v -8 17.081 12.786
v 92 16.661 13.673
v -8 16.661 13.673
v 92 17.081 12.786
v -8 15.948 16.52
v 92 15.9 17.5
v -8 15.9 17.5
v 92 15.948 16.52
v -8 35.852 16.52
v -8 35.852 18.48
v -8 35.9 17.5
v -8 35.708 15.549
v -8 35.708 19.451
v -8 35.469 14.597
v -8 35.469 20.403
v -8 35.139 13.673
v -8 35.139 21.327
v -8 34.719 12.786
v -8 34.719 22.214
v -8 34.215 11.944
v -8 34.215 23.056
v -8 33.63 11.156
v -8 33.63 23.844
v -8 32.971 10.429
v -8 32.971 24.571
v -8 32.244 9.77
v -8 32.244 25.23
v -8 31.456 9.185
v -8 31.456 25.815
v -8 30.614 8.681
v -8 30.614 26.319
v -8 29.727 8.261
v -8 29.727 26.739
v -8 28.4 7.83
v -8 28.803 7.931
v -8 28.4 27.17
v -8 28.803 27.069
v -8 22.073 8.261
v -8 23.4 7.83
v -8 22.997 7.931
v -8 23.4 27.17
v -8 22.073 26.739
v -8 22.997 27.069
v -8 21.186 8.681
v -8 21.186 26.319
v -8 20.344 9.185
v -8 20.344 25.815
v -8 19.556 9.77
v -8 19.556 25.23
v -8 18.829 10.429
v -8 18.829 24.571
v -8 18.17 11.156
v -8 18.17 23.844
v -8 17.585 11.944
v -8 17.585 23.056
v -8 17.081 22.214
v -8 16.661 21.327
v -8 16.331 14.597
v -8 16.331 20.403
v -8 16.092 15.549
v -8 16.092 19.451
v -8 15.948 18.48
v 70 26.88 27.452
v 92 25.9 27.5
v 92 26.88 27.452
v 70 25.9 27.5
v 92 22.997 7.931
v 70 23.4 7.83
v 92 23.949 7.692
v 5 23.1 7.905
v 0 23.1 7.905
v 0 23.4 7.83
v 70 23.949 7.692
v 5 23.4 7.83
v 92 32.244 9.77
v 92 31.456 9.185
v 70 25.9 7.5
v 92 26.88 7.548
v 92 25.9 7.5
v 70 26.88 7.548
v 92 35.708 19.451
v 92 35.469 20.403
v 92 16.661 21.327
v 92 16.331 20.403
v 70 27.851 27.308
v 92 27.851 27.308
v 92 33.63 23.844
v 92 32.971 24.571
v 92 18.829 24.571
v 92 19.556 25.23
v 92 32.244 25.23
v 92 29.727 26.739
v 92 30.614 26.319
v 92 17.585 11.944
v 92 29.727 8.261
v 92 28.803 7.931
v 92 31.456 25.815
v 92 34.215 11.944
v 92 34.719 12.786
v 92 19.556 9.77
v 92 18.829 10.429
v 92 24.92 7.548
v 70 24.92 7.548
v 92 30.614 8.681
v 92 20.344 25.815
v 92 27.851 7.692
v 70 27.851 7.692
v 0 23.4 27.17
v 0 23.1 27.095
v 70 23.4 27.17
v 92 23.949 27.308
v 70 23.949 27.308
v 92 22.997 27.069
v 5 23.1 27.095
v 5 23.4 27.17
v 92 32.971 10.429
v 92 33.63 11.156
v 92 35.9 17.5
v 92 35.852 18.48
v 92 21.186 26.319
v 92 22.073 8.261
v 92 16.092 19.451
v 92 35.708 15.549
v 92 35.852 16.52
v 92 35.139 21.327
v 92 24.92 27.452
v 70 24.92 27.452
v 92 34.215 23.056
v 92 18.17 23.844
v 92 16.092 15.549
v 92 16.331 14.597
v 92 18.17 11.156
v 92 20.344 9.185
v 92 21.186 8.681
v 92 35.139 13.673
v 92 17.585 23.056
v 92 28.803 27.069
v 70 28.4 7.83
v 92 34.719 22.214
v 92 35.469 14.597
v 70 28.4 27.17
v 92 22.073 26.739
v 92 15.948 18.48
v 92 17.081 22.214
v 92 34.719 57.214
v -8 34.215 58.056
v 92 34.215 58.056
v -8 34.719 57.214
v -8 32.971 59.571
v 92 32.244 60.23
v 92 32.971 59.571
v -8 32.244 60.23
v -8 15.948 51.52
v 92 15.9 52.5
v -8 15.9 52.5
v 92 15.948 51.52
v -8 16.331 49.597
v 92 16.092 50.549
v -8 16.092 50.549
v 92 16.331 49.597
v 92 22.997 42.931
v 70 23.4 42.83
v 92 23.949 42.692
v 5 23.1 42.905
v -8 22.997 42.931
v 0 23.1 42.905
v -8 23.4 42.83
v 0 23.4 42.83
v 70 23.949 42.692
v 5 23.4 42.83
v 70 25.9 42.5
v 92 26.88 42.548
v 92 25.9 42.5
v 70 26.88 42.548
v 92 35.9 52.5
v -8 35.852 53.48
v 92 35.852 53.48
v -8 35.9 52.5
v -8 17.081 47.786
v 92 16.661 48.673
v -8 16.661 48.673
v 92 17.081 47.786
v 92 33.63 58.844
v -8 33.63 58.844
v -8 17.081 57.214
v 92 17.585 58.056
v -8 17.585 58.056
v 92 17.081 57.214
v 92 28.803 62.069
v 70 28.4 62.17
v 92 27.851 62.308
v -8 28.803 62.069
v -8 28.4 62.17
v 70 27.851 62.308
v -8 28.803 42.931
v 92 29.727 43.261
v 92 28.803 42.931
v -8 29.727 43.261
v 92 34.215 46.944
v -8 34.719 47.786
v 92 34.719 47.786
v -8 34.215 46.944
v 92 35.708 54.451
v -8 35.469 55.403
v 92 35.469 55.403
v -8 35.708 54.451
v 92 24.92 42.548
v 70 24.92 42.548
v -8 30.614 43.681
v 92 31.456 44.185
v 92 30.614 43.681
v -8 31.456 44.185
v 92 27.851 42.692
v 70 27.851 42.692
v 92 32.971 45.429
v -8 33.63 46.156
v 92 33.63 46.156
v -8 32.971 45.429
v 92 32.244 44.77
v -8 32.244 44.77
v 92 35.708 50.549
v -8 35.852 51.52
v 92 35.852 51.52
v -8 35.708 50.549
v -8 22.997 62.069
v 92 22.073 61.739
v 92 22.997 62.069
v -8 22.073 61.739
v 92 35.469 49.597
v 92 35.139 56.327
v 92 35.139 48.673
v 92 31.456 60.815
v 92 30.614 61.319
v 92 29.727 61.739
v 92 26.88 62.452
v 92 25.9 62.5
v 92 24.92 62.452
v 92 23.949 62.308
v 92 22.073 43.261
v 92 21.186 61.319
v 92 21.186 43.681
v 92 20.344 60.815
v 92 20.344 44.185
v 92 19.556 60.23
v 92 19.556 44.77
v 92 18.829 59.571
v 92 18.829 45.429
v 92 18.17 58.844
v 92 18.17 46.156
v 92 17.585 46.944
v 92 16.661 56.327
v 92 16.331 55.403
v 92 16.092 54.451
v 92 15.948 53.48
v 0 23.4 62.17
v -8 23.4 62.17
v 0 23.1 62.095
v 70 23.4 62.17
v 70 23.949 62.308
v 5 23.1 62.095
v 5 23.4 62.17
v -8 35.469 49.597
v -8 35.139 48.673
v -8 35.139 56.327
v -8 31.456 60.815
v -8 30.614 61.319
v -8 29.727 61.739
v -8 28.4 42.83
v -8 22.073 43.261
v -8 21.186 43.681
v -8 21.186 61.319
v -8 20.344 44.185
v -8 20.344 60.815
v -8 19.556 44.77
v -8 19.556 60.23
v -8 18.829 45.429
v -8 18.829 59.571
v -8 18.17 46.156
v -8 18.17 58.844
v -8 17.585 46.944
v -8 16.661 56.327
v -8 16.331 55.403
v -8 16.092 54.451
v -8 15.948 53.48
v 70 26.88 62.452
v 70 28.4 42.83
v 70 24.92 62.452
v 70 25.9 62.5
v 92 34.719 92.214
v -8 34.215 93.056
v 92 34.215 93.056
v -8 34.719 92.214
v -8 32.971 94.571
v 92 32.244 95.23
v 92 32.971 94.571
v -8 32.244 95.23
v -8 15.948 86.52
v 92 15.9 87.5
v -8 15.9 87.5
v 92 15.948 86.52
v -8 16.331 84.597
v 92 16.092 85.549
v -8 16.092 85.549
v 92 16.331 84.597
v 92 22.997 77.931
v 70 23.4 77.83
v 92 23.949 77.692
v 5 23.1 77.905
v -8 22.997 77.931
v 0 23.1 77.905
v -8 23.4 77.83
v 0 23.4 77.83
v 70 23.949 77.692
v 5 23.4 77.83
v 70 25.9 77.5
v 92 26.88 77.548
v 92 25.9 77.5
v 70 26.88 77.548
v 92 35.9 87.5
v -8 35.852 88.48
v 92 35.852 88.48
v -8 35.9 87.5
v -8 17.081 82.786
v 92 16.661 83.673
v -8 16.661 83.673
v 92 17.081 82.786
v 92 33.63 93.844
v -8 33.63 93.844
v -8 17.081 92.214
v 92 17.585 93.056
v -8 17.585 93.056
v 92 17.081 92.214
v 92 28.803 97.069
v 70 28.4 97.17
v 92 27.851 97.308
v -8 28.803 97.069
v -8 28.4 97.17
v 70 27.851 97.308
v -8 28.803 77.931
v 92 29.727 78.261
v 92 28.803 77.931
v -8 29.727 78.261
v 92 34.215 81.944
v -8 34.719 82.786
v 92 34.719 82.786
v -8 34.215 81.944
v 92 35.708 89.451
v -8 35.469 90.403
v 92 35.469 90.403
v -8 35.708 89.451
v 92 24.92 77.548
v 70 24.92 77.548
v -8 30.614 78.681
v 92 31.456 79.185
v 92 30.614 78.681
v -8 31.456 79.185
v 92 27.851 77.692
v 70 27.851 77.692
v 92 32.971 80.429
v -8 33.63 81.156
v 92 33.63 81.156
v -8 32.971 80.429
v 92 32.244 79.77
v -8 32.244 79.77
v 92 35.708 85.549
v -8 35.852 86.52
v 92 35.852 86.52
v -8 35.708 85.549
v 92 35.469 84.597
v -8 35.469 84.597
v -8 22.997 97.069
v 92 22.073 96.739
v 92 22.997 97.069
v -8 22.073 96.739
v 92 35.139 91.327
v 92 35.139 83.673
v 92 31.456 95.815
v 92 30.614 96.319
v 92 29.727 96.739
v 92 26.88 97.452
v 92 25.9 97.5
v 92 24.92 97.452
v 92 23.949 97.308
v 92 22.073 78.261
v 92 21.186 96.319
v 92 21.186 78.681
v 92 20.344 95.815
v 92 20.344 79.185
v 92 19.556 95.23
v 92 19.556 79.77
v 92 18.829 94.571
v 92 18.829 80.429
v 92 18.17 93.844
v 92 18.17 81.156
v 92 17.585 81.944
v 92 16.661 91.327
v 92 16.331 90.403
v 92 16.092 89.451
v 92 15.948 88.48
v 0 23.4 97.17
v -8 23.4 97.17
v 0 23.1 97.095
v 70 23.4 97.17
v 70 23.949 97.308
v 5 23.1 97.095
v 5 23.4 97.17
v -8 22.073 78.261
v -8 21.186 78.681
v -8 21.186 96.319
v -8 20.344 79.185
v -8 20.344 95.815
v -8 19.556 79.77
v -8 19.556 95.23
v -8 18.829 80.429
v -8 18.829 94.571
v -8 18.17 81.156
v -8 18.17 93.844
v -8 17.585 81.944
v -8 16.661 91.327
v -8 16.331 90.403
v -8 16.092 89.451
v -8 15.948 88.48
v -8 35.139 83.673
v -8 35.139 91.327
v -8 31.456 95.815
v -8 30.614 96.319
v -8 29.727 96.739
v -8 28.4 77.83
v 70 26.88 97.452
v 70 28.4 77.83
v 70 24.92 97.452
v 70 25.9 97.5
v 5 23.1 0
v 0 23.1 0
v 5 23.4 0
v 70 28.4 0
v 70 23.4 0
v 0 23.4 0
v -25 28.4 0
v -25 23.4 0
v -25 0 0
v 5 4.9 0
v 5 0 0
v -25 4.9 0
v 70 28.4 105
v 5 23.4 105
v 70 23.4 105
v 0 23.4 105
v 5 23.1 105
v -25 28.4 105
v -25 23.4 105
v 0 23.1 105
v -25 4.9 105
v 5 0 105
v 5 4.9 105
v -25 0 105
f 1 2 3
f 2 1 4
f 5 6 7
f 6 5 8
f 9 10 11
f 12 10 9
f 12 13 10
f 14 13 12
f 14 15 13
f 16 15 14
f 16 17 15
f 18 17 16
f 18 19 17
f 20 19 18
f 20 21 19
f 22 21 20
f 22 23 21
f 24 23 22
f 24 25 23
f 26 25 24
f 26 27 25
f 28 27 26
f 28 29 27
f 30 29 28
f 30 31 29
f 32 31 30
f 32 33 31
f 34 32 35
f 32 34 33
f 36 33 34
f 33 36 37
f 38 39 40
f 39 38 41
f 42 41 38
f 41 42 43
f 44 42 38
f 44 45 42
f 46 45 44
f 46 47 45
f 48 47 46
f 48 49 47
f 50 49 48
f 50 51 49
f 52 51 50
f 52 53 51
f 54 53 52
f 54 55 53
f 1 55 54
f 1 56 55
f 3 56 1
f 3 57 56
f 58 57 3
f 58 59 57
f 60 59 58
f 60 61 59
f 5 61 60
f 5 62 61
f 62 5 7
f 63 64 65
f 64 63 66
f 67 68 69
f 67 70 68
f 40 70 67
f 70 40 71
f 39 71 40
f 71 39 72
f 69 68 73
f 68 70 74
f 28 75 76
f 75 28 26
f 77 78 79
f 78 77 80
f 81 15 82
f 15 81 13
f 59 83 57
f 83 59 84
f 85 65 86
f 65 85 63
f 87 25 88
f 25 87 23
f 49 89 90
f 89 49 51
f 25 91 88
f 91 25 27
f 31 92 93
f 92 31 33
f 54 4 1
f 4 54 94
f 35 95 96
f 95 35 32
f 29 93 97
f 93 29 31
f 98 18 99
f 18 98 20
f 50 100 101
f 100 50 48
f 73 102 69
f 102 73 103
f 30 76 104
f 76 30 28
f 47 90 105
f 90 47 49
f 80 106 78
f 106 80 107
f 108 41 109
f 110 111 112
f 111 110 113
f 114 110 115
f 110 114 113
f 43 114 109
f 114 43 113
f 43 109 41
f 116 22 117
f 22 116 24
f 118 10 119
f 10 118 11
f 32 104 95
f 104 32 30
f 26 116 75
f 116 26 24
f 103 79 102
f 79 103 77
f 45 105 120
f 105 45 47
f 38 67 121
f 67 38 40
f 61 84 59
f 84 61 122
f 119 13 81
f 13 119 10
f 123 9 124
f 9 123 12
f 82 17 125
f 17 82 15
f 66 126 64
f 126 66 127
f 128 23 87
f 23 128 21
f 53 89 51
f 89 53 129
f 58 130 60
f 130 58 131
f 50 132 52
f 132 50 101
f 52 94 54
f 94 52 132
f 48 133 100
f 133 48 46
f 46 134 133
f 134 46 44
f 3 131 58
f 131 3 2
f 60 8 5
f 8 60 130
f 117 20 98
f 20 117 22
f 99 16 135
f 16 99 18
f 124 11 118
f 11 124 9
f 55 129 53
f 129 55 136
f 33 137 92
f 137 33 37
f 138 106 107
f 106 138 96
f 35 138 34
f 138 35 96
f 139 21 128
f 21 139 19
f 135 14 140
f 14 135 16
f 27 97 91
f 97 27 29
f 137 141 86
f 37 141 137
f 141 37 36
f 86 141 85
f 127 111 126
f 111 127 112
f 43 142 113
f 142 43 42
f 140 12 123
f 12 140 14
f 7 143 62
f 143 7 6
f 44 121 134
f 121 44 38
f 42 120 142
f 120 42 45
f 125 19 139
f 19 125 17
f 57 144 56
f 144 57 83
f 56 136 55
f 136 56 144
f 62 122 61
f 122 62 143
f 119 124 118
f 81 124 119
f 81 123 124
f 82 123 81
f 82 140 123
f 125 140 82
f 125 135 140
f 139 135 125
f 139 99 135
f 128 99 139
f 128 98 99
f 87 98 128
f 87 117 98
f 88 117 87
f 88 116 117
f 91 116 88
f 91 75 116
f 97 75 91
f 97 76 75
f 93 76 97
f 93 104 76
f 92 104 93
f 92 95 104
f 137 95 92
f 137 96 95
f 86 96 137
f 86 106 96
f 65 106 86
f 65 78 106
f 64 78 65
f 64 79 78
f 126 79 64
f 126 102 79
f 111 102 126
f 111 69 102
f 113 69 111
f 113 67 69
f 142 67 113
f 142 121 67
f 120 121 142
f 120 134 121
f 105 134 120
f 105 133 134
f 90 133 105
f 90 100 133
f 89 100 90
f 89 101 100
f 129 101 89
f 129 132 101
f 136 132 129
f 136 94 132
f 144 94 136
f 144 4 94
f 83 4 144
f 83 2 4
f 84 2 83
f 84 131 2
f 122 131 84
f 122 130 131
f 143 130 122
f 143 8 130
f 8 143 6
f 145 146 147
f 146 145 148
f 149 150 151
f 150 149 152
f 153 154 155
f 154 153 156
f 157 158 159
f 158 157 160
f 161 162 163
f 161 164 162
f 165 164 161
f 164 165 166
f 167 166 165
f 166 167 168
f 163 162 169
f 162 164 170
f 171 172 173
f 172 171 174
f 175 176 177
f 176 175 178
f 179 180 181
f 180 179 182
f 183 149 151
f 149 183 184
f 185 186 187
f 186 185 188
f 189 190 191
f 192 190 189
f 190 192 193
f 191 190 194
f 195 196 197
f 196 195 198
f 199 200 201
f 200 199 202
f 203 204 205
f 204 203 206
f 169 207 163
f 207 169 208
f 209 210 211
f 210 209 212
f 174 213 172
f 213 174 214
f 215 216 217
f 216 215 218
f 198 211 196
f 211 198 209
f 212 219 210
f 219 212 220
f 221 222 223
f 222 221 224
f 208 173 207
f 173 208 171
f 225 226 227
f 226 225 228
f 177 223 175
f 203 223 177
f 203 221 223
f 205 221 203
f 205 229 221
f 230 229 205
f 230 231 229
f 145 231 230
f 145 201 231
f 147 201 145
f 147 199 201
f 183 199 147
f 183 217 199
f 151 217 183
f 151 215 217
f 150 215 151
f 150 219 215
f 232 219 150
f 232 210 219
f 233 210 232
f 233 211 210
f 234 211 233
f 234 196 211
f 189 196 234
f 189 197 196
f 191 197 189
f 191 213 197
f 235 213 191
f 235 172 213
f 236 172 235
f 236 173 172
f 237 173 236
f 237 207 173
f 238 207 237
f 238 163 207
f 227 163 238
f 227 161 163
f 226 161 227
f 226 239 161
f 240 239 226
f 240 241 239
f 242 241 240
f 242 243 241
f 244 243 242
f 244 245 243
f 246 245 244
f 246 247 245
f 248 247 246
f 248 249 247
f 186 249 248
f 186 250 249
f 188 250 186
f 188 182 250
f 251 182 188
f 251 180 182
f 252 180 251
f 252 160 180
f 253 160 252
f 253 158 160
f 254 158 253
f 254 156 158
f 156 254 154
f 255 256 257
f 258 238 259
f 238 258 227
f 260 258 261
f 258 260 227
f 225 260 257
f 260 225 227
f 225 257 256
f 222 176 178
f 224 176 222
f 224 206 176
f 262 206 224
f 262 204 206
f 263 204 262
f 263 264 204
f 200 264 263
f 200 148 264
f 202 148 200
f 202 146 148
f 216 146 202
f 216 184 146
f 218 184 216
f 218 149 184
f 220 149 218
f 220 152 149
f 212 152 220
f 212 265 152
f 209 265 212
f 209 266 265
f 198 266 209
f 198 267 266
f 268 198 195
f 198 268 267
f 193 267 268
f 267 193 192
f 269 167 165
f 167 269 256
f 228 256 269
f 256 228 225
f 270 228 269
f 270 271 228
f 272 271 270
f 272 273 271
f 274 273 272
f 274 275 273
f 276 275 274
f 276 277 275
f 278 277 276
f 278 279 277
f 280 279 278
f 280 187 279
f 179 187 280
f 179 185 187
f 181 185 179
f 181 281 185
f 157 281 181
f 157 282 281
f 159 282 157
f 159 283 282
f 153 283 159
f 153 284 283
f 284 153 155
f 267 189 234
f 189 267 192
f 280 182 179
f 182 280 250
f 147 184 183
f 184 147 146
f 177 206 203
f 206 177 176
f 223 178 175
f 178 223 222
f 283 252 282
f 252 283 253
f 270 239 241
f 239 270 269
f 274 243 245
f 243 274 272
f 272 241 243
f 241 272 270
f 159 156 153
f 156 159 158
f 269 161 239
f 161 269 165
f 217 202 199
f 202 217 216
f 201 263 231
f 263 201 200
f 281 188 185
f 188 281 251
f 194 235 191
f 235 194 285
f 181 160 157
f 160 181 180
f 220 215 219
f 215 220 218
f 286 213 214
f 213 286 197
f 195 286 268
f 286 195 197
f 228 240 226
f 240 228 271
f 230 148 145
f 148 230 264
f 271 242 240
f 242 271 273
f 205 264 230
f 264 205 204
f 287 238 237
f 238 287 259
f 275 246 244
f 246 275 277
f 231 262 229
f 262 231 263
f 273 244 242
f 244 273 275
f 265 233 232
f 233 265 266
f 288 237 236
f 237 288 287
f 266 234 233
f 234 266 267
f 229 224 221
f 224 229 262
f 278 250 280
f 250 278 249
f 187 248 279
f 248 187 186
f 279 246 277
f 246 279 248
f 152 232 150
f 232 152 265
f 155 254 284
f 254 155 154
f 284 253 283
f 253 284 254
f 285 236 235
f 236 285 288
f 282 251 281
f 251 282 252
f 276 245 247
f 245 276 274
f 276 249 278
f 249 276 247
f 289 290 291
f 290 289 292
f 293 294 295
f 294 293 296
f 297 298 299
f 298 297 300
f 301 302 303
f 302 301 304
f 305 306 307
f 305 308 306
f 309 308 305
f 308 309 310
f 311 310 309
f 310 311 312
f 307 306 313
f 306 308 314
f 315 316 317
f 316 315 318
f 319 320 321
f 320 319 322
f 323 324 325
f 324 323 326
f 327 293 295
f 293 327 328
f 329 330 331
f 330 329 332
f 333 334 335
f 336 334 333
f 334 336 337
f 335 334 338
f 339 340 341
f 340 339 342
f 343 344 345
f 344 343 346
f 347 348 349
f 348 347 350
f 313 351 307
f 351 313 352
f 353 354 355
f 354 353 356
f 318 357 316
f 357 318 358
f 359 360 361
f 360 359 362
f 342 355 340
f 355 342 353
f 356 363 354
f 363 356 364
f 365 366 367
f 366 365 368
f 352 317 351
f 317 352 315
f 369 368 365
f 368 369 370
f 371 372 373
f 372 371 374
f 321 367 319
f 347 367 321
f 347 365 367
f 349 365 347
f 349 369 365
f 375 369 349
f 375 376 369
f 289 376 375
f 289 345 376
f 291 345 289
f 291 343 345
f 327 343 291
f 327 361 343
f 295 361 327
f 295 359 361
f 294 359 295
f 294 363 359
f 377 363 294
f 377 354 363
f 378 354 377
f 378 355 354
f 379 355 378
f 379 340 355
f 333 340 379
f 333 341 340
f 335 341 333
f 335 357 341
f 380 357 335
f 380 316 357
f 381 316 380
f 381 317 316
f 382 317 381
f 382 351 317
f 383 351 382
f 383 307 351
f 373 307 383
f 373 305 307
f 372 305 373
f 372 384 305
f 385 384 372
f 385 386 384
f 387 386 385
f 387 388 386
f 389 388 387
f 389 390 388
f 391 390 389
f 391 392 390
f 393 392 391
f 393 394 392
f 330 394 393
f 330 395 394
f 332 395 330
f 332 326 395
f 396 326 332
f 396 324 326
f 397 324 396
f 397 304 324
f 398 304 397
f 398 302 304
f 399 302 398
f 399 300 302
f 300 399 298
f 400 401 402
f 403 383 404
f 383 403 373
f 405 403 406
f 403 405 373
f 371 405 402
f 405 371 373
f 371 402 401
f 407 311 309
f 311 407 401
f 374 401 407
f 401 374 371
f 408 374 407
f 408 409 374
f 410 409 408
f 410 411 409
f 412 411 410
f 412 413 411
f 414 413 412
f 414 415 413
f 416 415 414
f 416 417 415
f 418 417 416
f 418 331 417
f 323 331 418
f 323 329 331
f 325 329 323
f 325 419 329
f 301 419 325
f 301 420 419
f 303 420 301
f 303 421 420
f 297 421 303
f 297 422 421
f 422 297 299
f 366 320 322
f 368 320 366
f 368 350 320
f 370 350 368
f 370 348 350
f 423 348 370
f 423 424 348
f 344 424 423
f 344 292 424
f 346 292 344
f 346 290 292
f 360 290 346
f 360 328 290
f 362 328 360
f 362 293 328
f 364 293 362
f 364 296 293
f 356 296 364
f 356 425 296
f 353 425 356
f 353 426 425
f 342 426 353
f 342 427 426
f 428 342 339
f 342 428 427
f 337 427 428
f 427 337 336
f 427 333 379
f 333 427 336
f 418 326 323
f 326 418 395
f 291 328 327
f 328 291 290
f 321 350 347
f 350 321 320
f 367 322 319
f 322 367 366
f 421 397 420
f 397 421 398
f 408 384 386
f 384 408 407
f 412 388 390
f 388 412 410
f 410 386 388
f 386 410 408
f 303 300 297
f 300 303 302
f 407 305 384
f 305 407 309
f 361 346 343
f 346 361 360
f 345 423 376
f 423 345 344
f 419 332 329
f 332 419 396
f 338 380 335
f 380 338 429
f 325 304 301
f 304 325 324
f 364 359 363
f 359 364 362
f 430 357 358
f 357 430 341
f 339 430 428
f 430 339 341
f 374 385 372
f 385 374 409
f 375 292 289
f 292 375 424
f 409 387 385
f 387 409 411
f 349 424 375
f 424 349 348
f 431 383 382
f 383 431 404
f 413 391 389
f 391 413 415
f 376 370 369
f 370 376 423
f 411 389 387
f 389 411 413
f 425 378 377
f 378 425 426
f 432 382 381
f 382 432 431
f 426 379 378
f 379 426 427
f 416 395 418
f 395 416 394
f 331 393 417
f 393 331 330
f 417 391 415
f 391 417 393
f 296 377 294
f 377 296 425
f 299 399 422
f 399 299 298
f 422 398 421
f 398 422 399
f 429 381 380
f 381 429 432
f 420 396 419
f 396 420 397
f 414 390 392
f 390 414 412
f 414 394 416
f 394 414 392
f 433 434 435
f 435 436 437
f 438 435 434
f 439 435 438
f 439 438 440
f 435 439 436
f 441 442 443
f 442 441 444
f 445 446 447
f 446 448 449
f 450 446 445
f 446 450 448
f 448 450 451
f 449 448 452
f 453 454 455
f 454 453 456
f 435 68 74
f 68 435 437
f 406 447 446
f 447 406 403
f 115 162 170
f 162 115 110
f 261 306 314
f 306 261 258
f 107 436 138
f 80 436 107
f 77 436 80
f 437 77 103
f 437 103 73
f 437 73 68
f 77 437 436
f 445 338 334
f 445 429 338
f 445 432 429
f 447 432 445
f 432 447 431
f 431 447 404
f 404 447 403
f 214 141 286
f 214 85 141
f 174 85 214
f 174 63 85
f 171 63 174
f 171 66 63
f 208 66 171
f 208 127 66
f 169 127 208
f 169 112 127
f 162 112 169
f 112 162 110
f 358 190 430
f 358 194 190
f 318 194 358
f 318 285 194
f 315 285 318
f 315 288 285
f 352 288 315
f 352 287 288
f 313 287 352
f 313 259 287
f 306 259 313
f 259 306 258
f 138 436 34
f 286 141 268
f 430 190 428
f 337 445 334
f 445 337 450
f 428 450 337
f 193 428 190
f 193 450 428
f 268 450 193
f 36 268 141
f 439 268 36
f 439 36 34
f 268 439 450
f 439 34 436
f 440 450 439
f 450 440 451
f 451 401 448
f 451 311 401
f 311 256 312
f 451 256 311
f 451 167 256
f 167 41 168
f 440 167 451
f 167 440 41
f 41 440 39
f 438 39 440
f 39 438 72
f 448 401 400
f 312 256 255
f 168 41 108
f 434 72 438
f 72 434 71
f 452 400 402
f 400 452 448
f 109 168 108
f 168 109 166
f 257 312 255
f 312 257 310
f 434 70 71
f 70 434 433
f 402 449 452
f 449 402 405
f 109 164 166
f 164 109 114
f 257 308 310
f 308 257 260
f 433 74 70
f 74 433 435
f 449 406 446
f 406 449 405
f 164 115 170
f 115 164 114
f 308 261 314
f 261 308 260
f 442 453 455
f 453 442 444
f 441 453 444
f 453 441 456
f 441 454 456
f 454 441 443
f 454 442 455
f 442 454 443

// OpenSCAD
// --- Dimensions ---
shelf_thickness = 18.0;      // Thickness of the shelf to be clamped
arm_length = 65.0;           // Total length of the top jaw/arm along X
spine_width = 5.0;           // Width of the vertical spine (X direction)
spine_depth = 28.4;          // Depth of the spine (Y direction)
bottom_jaw_width = 25.0;     // Width of the bottom jaw (X direction)
bottom_jaw_depth = 5.0;       // Depth of the bottom jaw (Y direction)
top_jaw_height = 5.0;        // Height of the top jaw (Y direction)
gap_clearance = 0.4;         // Extra clearance for the 18mm shelf (18.4 total)
hole_diameter = 20.0;        // Diameter of the pipette holes
hole_spacing = 35.0;         // Distance between hole centers (87.5 - 52.5)
extrusion_length = 105.0;    // Total length of the part along Z
hole_x_pos = 42.0;           // X coordinate of the hole centers
hole_z_start = 17.5;         // Z coordinate of the first hole center
hole_z_end = 87.5;           // Z coordinate of the last hole center

/* 
   Print Orientation: 
   Lying on its side in the XY plane.
   The profile is defined in XY, and extruded along Z.
   Note: The user requested the profile be extruded 105mm along Z.
   In this orientation:
   X = Width of the clamp profile
   Y = Depth of the clamp profile (the "up" direction in use)
   Z = The extrusion length (105mm)
*/

$fn = 64;

// Helper to create the 2D profile of the C-clamp
module clamp_profile() {
    difference() {
        // Main body union
        union() {
            // Spine: x=[0, 5], y=[0, 28.4]
            translate([0, 0])
                square([spine_width, spine_depth]);
            
            // Bottom Jaw: x=[-25, 5], y=[0, 5]
            translate([-bottom_jaw_width, 0])
                square([bottom_jaw_width + spine_width, bottom_jaw_depth]);
            
            // Top Jaw and Arm: x=[-25, 65], y=[23.4, 28.4]
            translate([-bottom_jaw_width, 23.4])
                square([bottom_jaw_width + spine_width + arm_length, top_jaw_height]);
        }

        // The gap for the shelf (to make it a C-shape)
        // We subtract a rectangle that is slightly larger to ensure a clean cut
        translate([-bottom_jaw_width - 1, 5 - 0.1])
            square([bottom_jaw_width + spine_width + arm_length + 2, shelf_thickness + 0.2]);
    }
}

// Main Construction
union() {
    // Extrude the 2D profile along the Z axis
    linear_extrude(height = extrusion_length) {
        clamp_profile();
    }

    // Create the three holes
    // Since the profile is extruded along Z, the holes go "through" the arm.
    // The arm is in the XY plane, so the holes are drilled along the Z axis.
    // However, the user specified the holes are "through the arm along Y (vertically in use)".
    // In this print orientation (XY profile, Z extrusion), "vertically in use" is the Y axis.
    // Therefore, the holes must be cylinders oriented along the Y axis.
    
    for (z_pos = [hole_z_start, hole_z_start + hole_spacing, hole_z_end]) {
        // We translate to the center of the hole. 
        // Since the holes are through the arm (which is at Y=23.4 to 28.4),
        // and the hole center is at X=42, we must ensure the cylinder is long enough.
        translate([hole_x_pos, 25.9, z_pos]) // 25.9 is roughly the center of the top jaw Y
            rotate([0, 90, 0]) // Rotate to align with Y axis
                cylinder(h = 100, d = hole_diameter, center = true);
    }
}

// Note on Hole Alignment:
// The user requested holes at x=42, z=17.5, 52.5, 87.5.
// In this print orientation, Z is the extrusion axis. 
// The holes are drilled through the arm (which is the Y direction in use).
// Therefore, the holes are cylinders centered at (X=42, Z=z_pos) and running along Y.
